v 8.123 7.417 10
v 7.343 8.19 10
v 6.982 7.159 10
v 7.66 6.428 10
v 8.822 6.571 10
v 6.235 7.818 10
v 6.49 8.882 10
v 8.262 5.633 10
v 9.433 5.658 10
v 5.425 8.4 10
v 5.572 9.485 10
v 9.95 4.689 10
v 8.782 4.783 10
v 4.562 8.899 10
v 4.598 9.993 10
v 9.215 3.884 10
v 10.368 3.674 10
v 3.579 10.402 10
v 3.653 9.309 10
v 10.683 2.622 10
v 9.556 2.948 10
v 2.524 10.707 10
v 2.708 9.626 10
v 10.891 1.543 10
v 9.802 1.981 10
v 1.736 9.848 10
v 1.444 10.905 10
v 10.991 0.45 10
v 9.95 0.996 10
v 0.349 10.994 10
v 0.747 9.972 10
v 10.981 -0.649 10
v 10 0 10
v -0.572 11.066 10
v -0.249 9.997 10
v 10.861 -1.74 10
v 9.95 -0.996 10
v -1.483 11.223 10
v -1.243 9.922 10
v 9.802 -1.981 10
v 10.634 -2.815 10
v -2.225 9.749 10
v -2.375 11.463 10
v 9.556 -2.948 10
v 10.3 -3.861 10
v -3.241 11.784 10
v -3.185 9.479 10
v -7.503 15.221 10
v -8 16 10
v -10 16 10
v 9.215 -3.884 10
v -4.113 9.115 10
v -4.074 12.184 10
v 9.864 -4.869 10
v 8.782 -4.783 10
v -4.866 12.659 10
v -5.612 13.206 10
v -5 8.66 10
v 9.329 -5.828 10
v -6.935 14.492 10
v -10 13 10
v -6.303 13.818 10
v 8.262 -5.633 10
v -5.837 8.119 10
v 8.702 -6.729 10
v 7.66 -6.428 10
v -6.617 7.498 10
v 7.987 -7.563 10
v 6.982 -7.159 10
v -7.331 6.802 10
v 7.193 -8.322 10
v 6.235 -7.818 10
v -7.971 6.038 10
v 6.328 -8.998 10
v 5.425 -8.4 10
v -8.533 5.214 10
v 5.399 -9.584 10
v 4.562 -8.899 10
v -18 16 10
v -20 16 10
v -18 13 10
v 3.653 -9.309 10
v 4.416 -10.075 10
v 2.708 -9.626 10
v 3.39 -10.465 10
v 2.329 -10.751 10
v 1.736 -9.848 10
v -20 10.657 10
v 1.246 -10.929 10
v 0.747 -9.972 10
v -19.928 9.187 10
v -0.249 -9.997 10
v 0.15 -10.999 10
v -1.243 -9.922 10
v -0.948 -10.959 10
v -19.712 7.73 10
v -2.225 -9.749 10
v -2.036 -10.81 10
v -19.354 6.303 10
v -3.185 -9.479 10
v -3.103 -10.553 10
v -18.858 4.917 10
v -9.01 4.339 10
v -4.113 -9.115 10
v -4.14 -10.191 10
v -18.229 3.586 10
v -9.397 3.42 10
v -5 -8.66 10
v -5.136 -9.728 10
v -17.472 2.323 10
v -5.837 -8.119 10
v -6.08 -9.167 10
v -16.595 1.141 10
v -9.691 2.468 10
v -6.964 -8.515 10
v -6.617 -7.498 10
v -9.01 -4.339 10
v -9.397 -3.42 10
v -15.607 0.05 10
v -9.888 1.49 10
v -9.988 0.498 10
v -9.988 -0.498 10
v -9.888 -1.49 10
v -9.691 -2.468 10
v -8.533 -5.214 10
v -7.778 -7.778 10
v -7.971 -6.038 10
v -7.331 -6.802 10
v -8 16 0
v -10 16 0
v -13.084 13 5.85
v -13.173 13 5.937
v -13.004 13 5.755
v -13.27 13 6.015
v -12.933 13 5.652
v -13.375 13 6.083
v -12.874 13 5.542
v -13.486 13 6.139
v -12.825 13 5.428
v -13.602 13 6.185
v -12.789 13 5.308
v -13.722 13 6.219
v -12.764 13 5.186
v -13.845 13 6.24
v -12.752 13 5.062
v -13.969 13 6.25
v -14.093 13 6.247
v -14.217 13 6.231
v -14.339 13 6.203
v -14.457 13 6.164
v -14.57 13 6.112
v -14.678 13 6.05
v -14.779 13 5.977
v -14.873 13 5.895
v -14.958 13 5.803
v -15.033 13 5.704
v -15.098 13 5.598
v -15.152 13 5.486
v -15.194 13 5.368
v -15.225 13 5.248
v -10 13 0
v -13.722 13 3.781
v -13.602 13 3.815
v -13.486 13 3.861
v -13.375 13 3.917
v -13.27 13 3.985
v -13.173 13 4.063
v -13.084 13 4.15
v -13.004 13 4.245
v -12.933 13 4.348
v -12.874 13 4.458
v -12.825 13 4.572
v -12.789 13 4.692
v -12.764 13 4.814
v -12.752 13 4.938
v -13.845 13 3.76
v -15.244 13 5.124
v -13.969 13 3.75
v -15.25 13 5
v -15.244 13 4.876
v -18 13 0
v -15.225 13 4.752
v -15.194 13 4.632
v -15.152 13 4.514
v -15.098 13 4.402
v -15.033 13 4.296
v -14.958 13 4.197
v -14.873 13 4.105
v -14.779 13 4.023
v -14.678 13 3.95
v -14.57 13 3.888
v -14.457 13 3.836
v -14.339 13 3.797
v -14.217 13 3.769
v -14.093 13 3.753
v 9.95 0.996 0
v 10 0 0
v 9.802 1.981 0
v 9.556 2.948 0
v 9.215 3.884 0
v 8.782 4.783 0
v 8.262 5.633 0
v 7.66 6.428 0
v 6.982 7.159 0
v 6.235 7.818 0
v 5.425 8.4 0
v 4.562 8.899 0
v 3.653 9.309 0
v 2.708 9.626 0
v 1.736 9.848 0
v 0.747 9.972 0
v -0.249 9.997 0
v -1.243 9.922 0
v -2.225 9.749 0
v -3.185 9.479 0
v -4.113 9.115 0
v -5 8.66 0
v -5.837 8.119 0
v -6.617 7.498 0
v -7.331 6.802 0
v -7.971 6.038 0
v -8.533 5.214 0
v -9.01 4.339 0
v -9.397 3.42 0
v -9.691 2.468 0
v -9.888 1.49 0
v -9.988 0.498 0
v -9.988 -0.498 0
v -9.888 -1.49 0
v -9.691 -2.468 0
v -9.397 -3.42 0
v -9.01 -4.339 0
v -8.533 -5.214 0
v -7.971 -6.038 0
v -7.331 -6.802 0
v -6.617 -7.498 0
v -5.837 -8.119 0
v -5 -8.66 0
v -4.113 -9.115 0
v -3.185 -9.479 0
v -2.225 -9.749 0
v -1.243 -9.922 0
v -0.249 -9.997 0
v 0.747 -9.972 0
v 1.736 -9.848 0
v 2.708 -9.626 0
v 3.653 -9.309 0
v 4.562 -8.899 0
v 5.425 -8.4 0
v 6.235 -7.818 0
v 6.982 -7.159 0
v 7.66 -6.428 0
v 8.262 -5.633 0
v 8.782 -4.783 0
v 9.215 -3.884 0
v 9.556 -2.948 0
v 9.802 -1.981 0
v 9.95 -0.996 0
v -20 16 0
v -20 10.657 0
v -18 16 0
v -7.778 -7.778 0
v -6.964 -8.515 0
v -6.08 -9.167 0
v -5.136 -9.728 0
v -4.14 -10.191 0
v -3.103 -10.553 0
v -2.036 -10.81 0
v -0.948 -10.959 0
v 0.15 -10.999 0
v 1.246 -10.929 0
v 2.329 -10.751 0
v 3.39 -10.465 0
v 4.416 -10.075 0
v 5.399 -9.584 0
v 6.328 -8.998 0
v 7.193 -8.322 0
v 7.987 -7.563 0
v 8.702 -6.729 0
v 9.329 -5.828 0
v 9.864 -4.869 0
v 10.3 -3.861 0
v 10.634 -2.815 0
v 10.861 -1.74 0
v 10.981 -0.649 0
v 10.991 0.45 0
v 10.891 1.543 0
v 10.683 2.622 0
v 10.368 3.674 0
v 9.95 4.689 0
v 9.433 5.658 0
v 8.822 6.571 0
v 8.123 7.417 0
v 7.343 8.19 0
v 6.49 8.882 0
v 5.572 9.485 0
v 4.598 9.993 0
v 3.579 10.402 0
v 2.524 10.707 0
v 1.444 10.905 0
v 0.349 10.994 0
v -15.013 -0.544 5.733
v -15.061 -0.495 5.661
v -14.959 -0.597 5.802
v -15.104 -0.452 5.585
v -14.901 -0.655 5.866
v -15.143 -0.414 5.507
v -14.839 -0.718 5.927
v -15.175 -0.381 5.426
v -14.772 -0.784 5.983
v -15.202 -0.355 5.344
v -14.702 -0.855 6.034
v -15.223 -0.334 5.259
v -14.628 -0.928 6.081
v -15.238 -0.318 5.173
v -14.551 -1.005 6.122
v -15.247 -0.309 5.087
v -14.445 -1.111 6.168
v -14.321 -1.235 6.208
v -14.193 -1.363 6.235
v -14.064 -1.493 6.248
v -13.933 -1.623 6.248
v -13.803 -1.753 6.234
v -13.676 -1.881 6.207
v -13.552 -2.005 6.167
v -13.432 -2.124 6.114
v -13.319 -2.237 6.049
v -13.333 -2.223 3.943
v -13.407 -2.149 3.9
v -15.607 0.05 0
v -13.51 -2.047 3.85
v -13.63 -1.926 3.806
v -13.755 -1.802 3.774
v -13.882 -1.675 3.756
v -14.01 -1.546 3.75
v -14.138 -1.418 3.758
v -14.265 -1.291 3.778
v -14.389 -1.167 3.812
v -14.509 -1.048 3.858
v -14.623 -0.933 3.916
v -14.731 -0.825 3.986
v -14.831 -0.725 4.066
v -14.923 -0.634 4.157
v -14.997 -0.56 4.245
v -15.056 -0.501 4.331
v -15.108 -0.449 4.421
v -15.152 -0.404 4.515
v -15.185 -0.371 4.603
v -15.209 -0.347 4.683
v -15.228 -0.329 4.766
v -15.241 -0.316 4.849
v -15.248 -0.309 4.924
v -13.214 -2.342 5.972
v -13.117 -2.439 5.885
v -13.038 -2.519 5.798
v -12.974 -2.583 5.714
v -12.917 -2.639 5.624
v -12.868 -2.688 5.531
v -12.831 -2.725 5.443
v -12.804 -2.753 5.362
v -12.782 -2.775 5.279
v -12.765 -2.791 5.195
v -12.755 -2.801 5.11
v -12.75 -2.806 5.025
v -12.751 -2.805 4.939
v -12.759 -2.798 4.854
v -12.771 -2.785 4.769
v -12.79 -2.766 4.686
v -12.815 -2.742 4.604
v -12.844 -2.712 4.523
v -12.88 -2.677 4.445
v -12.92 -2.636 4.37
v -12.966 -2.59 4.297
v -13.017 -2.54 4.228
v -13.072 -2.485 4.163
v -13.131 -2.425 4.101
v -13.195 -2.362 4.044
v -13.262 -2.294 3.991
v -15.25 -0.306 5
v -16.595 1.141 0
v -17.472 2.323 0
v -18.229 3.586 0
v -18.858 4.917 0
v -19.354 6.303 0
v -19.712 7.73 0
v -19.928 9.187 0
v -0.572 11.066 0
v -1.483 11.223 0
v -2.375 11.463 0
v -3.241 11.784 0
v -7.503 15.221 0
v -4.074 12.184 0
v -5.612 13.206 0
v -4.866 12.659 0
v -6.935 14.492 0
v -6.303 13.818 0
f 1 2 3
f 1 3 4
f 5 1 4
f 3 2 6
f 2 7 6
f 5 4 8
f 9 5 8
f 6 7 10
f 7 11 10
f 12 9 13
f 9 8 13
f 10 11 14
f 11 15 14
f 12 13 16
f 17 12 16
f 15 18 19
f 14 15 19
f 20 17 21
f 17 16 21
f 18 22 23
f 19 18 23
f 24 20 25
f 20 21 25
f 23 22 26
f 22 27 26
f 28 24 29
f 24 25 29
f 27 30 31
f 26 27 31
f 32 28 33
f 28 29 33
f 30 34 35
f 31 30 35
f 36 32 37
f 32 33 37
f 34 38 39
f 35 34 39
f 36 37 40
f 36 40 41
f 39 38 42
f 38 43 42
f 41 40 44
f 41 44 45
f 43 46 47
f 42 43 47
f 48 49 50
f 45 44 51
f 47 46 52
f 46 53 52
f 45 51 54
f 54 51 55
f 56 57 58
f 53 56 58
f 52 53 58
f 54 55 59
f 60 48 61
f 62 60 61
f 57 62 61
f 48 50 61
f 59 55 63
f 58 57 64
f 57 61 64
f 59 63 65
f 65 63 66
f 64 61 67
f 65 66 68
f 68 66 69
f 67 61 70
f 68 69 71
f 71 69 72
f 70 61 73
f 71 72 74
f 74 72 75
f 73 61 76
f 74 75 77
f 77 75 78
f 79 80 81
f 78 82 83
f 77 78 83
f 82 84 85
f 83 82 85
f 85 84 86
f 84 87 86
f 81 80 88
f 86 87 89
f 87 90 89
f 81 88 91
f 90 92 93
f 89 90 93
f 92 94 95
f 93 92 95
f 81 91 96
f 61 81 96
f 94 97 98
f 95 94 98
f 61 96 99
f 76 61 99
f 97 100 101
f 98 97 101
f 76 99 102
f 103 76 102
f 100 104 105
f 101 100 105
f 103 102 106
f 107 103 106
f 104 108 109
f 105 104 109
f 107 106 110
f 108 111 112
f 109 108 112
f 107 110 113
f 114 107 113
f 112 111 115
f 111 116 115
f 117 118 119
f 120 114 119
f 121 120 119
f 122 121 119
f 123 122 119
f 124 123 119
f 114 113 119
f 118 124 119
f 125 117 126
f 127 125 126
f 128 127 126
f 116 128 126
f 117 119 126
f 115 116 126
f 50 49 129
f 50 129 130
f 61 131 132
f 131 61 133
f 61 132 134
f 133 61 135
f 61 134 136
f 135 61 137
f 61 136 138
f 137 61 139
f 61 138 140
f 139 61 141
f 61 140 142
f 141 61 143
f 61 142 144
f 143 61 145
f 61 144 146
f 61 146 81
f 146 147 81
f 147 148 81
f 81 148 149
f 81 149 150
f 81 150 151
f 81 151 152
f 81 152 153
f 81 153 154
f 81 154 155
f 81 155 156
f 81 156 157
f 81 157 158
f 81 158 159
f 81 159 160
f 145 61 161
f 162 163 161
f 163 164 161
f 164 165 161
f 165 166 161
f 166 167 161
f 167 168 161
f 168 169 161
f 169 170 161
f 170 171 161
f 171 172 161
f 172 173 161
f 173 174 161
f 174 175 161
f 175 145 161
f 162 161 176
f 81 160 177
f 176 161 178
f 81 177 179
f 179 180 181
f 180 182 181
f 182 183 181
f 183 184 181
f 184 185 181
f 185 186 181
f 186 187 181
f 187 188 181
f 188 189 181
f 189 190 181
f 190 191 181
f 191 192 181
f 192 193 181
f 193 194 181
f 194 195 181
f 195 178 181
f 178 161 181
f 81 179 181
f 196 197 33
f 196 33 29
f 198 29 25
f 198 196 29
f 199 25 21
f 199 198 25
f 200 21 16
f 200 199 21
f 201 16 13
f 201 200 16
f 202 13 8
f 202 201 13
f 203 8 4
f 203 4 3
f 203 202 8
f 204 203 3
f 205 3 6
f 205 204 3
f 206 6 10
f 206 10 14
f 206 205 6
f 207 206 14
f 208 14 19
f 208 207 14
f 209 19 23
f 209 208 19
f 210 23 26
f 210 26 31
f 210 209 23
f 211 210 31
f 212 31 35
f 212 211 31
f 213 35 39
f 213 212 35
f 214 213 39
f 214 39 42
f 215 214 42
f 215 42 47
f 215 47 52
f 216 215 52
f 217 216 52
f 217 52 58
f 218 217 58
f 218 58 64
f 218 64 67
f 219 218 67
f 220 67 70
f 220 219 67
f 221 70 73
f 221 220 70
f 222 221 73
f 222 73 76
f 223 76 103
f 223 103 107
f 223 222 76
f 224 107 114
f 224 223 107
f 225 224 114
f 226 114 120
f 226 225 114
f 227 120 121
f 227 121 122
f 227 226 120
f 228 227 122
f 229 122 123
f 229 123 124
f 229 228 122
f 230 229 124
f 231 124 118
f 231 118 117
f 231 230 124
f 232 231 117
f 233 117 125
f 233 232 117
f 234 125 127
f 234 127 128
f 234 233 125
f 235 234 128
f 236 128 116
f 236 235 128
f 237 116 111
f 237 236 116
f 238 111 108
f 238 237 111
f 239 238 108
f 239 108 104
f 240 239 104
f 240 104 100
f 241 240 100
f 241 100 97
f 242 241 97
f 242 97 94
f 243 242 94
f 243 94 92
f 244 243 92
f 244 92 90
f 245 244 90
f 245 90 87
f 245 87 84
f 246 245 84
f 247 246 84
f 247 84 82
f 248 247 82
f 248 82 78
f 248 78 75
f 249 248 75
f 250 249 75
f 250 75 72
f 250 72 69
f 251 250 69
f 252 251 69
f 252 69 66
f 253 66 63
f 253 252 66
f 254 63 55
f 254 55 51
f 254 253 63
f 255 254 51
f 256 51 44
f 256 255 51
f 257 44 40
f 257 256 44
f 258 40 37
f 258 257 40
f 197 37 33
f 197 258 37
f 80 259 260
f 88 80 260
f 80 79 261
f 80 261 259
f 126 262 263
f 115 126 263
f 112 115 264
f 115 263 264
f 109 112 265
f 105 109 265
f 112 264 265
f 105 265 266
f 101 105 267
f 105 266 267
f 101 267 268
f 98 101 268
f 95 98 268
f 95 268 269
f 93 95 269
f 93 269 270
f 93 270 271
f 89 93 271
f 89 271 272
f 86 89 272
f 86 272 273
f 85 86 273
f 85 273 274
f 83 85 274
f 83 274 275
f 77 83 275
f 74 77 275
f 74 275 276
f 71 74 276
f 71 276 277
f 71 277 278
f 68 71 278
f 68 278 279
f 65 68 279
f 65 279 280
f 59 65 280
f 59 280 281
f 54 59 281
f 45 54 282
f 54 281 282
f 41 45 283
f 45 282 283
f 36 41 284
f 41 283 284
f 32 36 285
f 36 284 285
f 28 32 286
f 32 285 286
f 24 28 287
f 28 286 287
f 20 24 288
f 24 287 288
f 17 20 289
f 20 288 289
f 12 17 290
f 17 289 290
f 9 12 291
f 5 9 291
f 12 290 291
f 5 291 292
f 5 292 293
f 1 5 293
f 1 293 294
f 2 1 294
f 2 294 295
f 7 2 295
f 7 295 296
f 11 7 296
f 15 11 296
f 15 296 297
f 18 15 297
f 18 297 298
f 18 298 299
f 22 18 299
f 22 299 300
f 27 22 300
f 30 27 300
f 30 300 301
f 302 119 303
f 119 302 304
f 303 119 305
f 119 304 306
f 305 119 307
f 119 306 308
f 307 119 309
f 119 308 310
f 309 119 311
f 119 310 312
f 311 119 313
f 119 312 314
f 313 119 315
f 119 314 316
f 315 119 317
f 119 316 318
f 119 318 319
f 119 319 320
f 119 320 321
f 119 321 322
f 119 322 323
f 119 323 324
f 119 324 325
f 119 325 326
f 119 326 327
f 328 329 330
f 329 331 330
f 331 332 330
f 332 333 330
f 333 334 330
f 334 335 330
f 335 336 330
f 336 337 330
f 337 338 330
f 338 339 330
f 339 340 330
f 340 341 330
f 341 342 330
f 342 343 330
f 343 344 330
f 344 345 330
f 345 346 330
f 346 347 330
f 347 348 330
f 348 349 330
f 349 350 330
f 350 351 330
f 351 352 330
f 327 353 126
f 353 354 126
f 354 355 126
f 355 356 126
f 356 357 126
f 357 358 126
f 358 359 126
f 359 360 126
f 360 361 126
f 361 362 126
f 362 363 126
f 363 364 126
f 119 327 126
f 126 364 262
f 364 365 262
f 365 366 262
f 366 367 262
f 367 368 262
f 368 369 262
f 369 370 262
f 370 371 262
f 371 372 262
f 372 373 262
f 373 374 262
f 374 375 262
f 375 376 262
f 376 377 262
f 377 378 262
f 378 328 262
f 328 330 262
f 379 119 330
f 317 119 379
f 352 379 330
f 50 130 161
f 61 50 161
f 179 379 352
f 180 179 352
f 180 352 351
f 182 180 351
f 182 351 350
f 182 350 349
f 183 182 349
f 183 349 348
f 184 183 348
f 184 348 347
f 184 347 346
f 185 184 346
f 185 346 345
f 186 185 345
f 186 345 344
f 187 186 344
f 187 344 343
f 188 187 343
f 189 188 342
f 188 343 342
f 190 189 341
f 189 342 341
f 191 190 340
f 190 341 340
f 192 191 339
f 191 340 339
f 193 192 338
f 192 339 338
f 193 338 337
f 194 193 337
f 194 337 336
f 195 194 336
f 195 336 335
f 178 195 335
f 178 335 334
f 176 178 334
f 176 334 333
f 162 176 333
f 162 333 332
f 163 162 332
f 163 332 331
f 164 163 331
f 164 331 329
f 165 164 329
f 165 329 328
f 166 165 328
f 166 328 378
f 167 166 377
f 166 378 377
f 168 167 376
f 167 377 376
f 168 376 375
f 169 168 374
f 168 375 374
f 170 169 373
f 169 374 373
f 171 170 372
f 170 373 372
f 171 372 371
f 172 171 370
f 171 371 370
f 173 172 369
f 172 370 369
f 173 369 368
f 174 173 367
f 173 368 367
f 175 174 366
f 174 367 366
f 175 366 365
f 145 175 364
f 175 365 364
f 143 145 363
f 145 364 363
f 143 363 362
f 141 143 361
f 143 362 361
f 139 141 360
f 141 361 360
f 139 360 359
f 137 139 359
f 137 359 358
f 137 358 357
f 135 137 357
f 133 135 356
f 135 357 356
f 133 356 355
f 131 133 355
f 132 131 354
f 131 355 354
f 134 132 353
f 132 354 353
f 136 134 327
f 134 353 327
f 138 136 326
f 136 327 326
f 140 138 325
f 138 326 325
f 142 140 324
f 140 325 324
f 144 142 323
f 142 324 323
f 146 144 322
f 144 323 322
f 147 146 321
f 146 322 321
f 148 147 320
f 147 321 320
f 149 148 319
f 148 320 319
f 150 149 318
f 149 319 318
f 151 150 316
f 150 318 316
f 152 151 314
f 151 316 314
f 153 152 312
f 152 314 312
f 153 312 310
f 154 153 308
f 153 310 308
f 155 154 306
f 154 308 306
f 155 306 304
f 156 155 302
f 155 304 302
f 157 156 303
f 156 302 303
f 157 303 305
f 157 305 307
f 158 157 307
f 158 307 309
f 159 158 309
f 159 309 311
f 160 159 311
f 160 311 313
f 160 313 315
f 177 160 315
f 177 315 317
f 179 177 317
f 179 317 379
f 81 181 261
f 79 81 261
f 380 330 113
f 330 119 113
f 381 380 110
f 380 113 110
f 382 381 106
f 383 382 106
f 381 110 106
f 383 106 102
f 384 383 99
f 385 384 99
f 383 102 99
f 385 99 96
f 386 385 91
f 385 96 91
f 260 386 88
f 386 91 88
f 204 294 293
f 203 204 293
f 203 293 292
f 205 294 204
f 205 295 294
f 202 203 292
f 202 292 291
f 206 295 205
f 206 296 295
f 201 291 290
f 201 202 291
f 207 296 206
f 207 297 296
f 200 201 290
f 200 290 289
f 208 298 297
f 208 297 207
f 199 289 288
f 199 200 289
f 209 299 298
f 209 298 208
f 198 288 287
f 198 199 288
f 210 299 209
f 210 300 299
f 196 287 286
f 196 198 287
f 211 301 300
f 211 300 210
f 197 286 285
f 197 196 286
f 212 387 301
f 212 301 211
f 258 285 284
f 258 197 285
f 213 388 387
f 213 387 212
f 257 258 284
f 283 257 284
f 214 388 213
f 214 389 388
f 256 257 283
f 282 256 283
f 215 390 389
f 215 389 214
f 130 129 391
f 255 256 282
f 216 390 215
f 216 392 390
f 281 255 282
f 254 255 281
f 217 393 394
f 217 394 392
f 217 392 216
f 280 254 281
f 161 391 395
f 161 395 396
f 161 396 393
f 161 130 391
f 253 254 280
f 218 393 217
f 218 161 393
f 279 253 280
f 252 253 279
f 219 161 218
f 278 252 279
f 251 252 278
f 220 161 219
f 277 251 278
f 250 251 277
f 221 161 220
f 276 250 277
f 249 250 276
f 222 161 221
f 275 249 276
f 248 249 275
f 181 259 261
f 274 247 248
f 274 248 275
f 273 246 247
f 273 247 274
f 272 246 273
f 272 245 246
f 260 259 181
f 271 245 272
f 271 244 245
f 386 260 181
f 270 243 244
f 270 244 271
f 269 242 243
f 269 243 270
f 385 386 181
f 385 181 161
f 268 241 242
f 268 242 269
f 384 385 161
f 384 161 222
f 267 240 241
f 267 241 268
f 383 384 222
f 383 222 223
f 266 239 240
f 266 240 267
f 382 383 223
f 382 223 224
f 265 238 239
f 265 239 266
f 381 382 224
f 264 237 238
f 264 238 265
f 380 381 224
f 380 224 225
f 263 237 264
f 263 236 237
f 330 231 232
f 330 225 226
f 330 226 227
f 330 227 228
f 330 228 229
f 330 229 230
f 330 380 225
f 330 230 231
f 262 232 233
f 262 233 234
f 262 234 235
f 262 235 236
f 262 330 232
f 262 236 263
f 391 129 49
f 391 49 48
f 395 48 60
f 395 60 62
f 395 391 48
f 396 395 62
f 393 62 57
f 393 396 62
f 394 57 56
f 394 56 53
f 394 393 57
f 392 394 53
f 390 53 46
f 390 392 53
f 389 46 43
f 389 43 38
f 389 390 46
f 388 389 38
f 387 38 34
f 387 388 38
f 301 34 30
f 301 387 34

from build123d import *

# Parameters (mm, degrees)
SKETCH1_R           = 10
BOSS_EXTRUDE1_DEPTH = 10
FILLET1_R           = 10
M3_TAPPED_HOLE1_D   = 2.5
FILLET2_R           = 15


with BuildPart() as part:
    # Sketch1 → Boss-Extrude1 (new body)
    with BuildSketch(Plane.XY):
        with BuildLine():
            Line((-18, 16), (-20, 16))
            Line((-20, 16), (-20, 4.443650814))
            Line((-20, 4.443650814), (-7.778174593, -7.778174593))
            ThreePointArc((-7.778174593, -7.778174593), (10.998848284, 0.159174228), (-8, 7.549834435))
            Line((-8, 7.549834435), (-8, 16))
            Line((-8, 16), (-10, 16))
            Line((-10, 16), (-10, 13))
            Line((-10, 13), (-18, 13))
            Line((-18, 13), (-18, 16))
        make_face()
        Circle(SKETCH1_R, mode=Mode.SUBTRACT)
    extrude(amount=BOSS_EXTRUDE1_DEPTH)

    # Fillet1
    # the kernel refuses this fillet: 10 mm, written as the material it adds along each edge
    with BuildSketch(Plane(origin=(-8, 7.549834435, 0), x_dir=(0, 1, 0), z_dir=(0, 0, 1))) as fillet1_piece_1:
        with BuildLine():
            CenterArc((13.43959092, -8.66635071), FILLET1_R, 119.930063337, 58.25157985)
            Line((3.444626465, -8.349040848), (3.244727176, -8.342694651))
            ThreePointArc((3.244727176, -8.342694651), (2.433829653, -3.880964752), (-0.137269717, -0.145454545))
            Line((-0.137269717, -0.145454545), (0, 0.2))
            ThreePointArc((0, 0.2), (4.225082782, 0.2), (8.350377058, 0.173327014))
            Line((8.350377058, 0.173327014), (8.450165565, 0))
        make_face()
    extrude(amount=10)

    # M3 Tapped Hole1 (through all)
    with Locations(Plane(origin=(0, 13, 0), x_dir=(1, 0, 0), z_dir=(0, 1, 0))):
        with Locations((-14, -5)):
            Hole(M3_TAPPED_HOLE1_D / 2)

    # Fillet2
    fillet2_edges = [part.edges().sort_by_distance(p)[0] for p in [
        (-20, 4.443650814, 5),
    ]]
    fillet(fillet2_edges, radius=FILLET2_R)


solid = part.part
